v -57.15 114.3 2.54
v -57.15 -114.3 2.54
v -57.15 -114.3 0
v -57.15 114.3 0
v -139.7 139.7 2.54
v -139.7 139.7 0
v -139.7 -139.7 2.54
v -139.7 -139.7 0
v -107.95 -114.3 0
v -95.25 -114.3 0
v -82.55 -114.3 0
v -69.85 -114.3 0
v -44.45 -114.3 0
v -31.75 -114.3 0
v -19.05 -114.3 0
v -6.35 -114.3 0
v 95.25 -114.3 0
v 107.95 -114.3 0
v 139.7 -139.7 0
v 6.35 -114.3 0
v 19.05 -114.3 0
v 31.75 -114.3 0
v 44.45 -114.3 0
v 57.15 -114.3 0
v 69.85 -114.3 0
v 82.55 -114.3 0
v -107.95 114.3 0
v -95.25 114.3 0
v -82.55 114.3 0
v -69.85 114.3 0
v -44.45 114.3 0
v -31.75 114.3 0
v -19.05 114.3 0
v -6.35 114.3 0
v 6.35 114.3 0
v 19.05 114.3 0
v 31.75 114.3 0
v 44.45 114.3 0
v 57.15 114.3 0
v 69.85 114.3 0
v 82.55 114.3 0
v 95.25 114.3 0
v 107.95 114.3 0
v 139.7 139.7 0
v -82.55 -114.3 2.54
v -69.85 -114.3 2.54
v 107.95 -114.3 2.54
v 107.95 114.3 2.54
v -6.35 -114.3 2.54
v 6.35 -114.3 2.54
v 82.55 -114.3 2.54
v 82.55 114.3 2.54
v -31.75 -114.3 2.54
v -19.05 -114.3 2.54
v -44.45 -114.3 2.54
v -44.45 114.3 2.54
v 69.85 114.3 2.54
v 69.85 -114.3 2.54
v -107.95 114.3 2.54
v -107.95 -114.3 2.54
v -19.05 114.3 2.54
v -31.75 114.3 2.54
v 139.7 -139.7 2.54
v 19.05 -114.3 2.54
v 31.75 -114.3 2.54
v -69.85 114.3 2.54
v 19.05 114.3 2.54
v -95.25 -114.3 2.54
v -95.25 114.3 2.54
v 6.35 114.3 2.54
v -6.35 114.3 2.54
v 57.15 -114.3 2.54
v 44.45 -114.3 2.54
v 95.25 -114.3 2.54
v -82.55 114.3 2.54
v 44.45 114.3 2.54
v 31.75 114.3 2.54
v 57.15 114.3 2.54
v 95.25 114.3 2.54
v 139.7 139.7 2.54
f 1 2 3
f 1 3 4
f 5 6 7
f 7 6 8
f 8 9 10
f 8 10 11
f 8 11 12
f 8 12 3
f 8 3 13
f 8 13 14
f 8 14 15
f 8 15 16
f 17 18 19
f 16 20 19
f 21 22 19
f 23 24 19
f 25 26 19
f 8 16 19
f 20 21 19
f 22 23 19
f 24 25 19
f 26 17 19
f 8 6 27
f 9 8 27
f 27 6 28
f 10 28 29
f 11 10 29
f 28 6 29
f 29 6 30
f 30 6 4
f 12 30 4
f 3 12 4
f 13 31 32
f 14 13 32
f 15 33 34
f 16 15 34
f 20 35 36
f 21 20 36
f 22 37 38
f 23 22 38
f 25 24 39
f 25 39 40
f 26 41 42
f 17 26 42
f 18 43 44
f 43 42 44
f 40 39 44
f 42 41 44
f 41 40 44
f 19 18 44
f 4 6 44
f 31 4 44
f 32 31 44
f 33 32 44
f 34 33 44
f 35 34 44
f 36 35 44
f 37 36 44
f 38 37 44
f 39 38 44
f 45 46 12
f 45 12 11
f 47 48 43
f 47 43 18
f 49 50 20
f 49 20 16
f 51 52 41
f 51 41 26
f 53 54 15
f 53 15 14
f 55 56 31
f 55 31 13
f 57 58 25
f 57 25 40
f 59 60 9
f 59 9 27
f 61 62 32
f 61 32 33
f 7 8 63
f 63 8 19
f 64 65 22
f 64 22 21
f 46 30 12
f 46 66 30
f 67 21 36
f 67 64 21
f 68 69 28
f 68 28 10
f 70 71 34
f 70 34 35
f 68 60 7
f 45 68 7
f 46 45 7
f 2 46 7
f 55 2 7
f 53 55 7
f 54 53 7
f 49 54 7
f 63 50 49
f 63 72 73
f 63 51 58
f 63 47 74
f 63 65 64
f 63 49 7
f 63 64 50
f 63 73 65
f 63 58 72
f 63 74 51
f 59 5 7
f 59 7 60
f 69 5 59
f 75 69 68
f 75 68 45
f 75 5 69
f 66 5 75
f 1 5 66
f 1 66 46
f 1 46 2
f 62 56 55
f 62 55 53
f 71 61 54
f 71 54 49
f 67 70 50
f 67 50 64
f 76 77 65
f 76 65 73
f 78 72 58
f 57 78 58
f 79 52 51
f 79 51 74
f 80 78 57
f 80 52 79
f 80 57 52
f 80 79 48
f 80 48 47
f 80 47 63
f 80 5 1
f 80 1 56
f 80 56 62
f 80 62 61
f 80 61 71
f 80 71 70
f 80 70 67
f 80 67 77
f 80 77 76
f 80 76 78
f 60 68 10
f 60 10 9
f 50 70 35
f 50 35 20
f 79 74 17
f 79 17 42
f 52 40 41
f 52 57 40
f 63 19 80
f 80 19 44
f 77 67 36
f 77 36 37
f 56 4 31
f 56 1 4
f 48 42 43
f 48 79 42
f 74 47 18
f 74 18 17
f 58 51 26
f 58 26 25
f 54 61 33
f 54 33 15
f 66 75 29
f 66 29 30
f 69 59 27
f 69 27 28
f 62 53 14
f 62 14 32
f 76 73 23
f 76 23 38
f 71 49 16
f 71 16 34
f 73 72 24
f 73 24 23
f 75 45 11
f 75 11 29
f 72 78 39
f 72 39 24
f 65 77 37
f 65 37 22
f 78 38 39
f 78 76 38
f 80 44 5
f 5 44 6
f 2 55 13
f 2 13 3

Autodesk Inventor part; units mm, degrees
ref_plane "YZ Plane" through (0, 0, 0) normal (1, 0, 0) x (0, 1, 0)
ref_plane "XZ Plane" through (0, 0, 0) normal (0, 1, 0) x (-1, 0, 0)
ref_plane "XY Plane" through (0, 0, 0) normal (0, 0, 1) x (1, 0, 0)
sketch "Sketch1" plane through (0, 0, 0) normal (0, 0, 1) x (1, 0, 0)
  line L0 (-139.7, -139.7) -> (139.7, -139.7)
  line L1 (139.7, -139.7) -> (139.7, 139.7)
  line L2 (139.7, 139.7) -> (-139.7, 139.7)
  line L3 (-139.7, 139.7) -> (-139.7, -139.7)
  line L4 (-139.7, -139.7) -> (139.7, 139.7) construction
  line L5 (139.7, -139.7) -> (-139.7, 139.7) construction
  point P0 (0, 0)
  dimension "d0" = 279.4
extrude "Extrusion1" add sketch "Sketch1" along normal blind 2.54
sketch "Sketch3" plane through (0, 0, 2.54) normal (0, 0, 1) x (1, 0, 0)
  line L0 (-107.95, 114.3) -> (-95.25, 114.3)
  line L1 (-95.25, 114.3) -> (-95.25, -114.3)
  line L2 (-95.25, -114.3) -> (-107.95, -114.3)
  line L3 (-107.95, -114.3) -> (-107.95, 114.3)
  line L4 (-107.95, 114.3) -> (-95.25, -114.3) construction
  line L5 (-95.25, 114.3) -> (-107.95, -114.3) construction
  line L6 (0, 0) -> (-101.6, 0)
  line L7 (-139.7, 139.7) -> (-139.7, -139.7) projected
  line L8 (-139.7, -139.7) -> (139.7, -139.7) projected
  dimension "d11" = 12.7
  dimension "d12" = 31.75
  dimension "d13" = 25.4
extrude "Extrusion2" cut sketch "Sketch3" against normal up to next
pattern_linear "Rectangular Pattern1" count 9 spacing 25.4 along (1, 0, 0) of "Extrusion2"
properties part number "screen"
